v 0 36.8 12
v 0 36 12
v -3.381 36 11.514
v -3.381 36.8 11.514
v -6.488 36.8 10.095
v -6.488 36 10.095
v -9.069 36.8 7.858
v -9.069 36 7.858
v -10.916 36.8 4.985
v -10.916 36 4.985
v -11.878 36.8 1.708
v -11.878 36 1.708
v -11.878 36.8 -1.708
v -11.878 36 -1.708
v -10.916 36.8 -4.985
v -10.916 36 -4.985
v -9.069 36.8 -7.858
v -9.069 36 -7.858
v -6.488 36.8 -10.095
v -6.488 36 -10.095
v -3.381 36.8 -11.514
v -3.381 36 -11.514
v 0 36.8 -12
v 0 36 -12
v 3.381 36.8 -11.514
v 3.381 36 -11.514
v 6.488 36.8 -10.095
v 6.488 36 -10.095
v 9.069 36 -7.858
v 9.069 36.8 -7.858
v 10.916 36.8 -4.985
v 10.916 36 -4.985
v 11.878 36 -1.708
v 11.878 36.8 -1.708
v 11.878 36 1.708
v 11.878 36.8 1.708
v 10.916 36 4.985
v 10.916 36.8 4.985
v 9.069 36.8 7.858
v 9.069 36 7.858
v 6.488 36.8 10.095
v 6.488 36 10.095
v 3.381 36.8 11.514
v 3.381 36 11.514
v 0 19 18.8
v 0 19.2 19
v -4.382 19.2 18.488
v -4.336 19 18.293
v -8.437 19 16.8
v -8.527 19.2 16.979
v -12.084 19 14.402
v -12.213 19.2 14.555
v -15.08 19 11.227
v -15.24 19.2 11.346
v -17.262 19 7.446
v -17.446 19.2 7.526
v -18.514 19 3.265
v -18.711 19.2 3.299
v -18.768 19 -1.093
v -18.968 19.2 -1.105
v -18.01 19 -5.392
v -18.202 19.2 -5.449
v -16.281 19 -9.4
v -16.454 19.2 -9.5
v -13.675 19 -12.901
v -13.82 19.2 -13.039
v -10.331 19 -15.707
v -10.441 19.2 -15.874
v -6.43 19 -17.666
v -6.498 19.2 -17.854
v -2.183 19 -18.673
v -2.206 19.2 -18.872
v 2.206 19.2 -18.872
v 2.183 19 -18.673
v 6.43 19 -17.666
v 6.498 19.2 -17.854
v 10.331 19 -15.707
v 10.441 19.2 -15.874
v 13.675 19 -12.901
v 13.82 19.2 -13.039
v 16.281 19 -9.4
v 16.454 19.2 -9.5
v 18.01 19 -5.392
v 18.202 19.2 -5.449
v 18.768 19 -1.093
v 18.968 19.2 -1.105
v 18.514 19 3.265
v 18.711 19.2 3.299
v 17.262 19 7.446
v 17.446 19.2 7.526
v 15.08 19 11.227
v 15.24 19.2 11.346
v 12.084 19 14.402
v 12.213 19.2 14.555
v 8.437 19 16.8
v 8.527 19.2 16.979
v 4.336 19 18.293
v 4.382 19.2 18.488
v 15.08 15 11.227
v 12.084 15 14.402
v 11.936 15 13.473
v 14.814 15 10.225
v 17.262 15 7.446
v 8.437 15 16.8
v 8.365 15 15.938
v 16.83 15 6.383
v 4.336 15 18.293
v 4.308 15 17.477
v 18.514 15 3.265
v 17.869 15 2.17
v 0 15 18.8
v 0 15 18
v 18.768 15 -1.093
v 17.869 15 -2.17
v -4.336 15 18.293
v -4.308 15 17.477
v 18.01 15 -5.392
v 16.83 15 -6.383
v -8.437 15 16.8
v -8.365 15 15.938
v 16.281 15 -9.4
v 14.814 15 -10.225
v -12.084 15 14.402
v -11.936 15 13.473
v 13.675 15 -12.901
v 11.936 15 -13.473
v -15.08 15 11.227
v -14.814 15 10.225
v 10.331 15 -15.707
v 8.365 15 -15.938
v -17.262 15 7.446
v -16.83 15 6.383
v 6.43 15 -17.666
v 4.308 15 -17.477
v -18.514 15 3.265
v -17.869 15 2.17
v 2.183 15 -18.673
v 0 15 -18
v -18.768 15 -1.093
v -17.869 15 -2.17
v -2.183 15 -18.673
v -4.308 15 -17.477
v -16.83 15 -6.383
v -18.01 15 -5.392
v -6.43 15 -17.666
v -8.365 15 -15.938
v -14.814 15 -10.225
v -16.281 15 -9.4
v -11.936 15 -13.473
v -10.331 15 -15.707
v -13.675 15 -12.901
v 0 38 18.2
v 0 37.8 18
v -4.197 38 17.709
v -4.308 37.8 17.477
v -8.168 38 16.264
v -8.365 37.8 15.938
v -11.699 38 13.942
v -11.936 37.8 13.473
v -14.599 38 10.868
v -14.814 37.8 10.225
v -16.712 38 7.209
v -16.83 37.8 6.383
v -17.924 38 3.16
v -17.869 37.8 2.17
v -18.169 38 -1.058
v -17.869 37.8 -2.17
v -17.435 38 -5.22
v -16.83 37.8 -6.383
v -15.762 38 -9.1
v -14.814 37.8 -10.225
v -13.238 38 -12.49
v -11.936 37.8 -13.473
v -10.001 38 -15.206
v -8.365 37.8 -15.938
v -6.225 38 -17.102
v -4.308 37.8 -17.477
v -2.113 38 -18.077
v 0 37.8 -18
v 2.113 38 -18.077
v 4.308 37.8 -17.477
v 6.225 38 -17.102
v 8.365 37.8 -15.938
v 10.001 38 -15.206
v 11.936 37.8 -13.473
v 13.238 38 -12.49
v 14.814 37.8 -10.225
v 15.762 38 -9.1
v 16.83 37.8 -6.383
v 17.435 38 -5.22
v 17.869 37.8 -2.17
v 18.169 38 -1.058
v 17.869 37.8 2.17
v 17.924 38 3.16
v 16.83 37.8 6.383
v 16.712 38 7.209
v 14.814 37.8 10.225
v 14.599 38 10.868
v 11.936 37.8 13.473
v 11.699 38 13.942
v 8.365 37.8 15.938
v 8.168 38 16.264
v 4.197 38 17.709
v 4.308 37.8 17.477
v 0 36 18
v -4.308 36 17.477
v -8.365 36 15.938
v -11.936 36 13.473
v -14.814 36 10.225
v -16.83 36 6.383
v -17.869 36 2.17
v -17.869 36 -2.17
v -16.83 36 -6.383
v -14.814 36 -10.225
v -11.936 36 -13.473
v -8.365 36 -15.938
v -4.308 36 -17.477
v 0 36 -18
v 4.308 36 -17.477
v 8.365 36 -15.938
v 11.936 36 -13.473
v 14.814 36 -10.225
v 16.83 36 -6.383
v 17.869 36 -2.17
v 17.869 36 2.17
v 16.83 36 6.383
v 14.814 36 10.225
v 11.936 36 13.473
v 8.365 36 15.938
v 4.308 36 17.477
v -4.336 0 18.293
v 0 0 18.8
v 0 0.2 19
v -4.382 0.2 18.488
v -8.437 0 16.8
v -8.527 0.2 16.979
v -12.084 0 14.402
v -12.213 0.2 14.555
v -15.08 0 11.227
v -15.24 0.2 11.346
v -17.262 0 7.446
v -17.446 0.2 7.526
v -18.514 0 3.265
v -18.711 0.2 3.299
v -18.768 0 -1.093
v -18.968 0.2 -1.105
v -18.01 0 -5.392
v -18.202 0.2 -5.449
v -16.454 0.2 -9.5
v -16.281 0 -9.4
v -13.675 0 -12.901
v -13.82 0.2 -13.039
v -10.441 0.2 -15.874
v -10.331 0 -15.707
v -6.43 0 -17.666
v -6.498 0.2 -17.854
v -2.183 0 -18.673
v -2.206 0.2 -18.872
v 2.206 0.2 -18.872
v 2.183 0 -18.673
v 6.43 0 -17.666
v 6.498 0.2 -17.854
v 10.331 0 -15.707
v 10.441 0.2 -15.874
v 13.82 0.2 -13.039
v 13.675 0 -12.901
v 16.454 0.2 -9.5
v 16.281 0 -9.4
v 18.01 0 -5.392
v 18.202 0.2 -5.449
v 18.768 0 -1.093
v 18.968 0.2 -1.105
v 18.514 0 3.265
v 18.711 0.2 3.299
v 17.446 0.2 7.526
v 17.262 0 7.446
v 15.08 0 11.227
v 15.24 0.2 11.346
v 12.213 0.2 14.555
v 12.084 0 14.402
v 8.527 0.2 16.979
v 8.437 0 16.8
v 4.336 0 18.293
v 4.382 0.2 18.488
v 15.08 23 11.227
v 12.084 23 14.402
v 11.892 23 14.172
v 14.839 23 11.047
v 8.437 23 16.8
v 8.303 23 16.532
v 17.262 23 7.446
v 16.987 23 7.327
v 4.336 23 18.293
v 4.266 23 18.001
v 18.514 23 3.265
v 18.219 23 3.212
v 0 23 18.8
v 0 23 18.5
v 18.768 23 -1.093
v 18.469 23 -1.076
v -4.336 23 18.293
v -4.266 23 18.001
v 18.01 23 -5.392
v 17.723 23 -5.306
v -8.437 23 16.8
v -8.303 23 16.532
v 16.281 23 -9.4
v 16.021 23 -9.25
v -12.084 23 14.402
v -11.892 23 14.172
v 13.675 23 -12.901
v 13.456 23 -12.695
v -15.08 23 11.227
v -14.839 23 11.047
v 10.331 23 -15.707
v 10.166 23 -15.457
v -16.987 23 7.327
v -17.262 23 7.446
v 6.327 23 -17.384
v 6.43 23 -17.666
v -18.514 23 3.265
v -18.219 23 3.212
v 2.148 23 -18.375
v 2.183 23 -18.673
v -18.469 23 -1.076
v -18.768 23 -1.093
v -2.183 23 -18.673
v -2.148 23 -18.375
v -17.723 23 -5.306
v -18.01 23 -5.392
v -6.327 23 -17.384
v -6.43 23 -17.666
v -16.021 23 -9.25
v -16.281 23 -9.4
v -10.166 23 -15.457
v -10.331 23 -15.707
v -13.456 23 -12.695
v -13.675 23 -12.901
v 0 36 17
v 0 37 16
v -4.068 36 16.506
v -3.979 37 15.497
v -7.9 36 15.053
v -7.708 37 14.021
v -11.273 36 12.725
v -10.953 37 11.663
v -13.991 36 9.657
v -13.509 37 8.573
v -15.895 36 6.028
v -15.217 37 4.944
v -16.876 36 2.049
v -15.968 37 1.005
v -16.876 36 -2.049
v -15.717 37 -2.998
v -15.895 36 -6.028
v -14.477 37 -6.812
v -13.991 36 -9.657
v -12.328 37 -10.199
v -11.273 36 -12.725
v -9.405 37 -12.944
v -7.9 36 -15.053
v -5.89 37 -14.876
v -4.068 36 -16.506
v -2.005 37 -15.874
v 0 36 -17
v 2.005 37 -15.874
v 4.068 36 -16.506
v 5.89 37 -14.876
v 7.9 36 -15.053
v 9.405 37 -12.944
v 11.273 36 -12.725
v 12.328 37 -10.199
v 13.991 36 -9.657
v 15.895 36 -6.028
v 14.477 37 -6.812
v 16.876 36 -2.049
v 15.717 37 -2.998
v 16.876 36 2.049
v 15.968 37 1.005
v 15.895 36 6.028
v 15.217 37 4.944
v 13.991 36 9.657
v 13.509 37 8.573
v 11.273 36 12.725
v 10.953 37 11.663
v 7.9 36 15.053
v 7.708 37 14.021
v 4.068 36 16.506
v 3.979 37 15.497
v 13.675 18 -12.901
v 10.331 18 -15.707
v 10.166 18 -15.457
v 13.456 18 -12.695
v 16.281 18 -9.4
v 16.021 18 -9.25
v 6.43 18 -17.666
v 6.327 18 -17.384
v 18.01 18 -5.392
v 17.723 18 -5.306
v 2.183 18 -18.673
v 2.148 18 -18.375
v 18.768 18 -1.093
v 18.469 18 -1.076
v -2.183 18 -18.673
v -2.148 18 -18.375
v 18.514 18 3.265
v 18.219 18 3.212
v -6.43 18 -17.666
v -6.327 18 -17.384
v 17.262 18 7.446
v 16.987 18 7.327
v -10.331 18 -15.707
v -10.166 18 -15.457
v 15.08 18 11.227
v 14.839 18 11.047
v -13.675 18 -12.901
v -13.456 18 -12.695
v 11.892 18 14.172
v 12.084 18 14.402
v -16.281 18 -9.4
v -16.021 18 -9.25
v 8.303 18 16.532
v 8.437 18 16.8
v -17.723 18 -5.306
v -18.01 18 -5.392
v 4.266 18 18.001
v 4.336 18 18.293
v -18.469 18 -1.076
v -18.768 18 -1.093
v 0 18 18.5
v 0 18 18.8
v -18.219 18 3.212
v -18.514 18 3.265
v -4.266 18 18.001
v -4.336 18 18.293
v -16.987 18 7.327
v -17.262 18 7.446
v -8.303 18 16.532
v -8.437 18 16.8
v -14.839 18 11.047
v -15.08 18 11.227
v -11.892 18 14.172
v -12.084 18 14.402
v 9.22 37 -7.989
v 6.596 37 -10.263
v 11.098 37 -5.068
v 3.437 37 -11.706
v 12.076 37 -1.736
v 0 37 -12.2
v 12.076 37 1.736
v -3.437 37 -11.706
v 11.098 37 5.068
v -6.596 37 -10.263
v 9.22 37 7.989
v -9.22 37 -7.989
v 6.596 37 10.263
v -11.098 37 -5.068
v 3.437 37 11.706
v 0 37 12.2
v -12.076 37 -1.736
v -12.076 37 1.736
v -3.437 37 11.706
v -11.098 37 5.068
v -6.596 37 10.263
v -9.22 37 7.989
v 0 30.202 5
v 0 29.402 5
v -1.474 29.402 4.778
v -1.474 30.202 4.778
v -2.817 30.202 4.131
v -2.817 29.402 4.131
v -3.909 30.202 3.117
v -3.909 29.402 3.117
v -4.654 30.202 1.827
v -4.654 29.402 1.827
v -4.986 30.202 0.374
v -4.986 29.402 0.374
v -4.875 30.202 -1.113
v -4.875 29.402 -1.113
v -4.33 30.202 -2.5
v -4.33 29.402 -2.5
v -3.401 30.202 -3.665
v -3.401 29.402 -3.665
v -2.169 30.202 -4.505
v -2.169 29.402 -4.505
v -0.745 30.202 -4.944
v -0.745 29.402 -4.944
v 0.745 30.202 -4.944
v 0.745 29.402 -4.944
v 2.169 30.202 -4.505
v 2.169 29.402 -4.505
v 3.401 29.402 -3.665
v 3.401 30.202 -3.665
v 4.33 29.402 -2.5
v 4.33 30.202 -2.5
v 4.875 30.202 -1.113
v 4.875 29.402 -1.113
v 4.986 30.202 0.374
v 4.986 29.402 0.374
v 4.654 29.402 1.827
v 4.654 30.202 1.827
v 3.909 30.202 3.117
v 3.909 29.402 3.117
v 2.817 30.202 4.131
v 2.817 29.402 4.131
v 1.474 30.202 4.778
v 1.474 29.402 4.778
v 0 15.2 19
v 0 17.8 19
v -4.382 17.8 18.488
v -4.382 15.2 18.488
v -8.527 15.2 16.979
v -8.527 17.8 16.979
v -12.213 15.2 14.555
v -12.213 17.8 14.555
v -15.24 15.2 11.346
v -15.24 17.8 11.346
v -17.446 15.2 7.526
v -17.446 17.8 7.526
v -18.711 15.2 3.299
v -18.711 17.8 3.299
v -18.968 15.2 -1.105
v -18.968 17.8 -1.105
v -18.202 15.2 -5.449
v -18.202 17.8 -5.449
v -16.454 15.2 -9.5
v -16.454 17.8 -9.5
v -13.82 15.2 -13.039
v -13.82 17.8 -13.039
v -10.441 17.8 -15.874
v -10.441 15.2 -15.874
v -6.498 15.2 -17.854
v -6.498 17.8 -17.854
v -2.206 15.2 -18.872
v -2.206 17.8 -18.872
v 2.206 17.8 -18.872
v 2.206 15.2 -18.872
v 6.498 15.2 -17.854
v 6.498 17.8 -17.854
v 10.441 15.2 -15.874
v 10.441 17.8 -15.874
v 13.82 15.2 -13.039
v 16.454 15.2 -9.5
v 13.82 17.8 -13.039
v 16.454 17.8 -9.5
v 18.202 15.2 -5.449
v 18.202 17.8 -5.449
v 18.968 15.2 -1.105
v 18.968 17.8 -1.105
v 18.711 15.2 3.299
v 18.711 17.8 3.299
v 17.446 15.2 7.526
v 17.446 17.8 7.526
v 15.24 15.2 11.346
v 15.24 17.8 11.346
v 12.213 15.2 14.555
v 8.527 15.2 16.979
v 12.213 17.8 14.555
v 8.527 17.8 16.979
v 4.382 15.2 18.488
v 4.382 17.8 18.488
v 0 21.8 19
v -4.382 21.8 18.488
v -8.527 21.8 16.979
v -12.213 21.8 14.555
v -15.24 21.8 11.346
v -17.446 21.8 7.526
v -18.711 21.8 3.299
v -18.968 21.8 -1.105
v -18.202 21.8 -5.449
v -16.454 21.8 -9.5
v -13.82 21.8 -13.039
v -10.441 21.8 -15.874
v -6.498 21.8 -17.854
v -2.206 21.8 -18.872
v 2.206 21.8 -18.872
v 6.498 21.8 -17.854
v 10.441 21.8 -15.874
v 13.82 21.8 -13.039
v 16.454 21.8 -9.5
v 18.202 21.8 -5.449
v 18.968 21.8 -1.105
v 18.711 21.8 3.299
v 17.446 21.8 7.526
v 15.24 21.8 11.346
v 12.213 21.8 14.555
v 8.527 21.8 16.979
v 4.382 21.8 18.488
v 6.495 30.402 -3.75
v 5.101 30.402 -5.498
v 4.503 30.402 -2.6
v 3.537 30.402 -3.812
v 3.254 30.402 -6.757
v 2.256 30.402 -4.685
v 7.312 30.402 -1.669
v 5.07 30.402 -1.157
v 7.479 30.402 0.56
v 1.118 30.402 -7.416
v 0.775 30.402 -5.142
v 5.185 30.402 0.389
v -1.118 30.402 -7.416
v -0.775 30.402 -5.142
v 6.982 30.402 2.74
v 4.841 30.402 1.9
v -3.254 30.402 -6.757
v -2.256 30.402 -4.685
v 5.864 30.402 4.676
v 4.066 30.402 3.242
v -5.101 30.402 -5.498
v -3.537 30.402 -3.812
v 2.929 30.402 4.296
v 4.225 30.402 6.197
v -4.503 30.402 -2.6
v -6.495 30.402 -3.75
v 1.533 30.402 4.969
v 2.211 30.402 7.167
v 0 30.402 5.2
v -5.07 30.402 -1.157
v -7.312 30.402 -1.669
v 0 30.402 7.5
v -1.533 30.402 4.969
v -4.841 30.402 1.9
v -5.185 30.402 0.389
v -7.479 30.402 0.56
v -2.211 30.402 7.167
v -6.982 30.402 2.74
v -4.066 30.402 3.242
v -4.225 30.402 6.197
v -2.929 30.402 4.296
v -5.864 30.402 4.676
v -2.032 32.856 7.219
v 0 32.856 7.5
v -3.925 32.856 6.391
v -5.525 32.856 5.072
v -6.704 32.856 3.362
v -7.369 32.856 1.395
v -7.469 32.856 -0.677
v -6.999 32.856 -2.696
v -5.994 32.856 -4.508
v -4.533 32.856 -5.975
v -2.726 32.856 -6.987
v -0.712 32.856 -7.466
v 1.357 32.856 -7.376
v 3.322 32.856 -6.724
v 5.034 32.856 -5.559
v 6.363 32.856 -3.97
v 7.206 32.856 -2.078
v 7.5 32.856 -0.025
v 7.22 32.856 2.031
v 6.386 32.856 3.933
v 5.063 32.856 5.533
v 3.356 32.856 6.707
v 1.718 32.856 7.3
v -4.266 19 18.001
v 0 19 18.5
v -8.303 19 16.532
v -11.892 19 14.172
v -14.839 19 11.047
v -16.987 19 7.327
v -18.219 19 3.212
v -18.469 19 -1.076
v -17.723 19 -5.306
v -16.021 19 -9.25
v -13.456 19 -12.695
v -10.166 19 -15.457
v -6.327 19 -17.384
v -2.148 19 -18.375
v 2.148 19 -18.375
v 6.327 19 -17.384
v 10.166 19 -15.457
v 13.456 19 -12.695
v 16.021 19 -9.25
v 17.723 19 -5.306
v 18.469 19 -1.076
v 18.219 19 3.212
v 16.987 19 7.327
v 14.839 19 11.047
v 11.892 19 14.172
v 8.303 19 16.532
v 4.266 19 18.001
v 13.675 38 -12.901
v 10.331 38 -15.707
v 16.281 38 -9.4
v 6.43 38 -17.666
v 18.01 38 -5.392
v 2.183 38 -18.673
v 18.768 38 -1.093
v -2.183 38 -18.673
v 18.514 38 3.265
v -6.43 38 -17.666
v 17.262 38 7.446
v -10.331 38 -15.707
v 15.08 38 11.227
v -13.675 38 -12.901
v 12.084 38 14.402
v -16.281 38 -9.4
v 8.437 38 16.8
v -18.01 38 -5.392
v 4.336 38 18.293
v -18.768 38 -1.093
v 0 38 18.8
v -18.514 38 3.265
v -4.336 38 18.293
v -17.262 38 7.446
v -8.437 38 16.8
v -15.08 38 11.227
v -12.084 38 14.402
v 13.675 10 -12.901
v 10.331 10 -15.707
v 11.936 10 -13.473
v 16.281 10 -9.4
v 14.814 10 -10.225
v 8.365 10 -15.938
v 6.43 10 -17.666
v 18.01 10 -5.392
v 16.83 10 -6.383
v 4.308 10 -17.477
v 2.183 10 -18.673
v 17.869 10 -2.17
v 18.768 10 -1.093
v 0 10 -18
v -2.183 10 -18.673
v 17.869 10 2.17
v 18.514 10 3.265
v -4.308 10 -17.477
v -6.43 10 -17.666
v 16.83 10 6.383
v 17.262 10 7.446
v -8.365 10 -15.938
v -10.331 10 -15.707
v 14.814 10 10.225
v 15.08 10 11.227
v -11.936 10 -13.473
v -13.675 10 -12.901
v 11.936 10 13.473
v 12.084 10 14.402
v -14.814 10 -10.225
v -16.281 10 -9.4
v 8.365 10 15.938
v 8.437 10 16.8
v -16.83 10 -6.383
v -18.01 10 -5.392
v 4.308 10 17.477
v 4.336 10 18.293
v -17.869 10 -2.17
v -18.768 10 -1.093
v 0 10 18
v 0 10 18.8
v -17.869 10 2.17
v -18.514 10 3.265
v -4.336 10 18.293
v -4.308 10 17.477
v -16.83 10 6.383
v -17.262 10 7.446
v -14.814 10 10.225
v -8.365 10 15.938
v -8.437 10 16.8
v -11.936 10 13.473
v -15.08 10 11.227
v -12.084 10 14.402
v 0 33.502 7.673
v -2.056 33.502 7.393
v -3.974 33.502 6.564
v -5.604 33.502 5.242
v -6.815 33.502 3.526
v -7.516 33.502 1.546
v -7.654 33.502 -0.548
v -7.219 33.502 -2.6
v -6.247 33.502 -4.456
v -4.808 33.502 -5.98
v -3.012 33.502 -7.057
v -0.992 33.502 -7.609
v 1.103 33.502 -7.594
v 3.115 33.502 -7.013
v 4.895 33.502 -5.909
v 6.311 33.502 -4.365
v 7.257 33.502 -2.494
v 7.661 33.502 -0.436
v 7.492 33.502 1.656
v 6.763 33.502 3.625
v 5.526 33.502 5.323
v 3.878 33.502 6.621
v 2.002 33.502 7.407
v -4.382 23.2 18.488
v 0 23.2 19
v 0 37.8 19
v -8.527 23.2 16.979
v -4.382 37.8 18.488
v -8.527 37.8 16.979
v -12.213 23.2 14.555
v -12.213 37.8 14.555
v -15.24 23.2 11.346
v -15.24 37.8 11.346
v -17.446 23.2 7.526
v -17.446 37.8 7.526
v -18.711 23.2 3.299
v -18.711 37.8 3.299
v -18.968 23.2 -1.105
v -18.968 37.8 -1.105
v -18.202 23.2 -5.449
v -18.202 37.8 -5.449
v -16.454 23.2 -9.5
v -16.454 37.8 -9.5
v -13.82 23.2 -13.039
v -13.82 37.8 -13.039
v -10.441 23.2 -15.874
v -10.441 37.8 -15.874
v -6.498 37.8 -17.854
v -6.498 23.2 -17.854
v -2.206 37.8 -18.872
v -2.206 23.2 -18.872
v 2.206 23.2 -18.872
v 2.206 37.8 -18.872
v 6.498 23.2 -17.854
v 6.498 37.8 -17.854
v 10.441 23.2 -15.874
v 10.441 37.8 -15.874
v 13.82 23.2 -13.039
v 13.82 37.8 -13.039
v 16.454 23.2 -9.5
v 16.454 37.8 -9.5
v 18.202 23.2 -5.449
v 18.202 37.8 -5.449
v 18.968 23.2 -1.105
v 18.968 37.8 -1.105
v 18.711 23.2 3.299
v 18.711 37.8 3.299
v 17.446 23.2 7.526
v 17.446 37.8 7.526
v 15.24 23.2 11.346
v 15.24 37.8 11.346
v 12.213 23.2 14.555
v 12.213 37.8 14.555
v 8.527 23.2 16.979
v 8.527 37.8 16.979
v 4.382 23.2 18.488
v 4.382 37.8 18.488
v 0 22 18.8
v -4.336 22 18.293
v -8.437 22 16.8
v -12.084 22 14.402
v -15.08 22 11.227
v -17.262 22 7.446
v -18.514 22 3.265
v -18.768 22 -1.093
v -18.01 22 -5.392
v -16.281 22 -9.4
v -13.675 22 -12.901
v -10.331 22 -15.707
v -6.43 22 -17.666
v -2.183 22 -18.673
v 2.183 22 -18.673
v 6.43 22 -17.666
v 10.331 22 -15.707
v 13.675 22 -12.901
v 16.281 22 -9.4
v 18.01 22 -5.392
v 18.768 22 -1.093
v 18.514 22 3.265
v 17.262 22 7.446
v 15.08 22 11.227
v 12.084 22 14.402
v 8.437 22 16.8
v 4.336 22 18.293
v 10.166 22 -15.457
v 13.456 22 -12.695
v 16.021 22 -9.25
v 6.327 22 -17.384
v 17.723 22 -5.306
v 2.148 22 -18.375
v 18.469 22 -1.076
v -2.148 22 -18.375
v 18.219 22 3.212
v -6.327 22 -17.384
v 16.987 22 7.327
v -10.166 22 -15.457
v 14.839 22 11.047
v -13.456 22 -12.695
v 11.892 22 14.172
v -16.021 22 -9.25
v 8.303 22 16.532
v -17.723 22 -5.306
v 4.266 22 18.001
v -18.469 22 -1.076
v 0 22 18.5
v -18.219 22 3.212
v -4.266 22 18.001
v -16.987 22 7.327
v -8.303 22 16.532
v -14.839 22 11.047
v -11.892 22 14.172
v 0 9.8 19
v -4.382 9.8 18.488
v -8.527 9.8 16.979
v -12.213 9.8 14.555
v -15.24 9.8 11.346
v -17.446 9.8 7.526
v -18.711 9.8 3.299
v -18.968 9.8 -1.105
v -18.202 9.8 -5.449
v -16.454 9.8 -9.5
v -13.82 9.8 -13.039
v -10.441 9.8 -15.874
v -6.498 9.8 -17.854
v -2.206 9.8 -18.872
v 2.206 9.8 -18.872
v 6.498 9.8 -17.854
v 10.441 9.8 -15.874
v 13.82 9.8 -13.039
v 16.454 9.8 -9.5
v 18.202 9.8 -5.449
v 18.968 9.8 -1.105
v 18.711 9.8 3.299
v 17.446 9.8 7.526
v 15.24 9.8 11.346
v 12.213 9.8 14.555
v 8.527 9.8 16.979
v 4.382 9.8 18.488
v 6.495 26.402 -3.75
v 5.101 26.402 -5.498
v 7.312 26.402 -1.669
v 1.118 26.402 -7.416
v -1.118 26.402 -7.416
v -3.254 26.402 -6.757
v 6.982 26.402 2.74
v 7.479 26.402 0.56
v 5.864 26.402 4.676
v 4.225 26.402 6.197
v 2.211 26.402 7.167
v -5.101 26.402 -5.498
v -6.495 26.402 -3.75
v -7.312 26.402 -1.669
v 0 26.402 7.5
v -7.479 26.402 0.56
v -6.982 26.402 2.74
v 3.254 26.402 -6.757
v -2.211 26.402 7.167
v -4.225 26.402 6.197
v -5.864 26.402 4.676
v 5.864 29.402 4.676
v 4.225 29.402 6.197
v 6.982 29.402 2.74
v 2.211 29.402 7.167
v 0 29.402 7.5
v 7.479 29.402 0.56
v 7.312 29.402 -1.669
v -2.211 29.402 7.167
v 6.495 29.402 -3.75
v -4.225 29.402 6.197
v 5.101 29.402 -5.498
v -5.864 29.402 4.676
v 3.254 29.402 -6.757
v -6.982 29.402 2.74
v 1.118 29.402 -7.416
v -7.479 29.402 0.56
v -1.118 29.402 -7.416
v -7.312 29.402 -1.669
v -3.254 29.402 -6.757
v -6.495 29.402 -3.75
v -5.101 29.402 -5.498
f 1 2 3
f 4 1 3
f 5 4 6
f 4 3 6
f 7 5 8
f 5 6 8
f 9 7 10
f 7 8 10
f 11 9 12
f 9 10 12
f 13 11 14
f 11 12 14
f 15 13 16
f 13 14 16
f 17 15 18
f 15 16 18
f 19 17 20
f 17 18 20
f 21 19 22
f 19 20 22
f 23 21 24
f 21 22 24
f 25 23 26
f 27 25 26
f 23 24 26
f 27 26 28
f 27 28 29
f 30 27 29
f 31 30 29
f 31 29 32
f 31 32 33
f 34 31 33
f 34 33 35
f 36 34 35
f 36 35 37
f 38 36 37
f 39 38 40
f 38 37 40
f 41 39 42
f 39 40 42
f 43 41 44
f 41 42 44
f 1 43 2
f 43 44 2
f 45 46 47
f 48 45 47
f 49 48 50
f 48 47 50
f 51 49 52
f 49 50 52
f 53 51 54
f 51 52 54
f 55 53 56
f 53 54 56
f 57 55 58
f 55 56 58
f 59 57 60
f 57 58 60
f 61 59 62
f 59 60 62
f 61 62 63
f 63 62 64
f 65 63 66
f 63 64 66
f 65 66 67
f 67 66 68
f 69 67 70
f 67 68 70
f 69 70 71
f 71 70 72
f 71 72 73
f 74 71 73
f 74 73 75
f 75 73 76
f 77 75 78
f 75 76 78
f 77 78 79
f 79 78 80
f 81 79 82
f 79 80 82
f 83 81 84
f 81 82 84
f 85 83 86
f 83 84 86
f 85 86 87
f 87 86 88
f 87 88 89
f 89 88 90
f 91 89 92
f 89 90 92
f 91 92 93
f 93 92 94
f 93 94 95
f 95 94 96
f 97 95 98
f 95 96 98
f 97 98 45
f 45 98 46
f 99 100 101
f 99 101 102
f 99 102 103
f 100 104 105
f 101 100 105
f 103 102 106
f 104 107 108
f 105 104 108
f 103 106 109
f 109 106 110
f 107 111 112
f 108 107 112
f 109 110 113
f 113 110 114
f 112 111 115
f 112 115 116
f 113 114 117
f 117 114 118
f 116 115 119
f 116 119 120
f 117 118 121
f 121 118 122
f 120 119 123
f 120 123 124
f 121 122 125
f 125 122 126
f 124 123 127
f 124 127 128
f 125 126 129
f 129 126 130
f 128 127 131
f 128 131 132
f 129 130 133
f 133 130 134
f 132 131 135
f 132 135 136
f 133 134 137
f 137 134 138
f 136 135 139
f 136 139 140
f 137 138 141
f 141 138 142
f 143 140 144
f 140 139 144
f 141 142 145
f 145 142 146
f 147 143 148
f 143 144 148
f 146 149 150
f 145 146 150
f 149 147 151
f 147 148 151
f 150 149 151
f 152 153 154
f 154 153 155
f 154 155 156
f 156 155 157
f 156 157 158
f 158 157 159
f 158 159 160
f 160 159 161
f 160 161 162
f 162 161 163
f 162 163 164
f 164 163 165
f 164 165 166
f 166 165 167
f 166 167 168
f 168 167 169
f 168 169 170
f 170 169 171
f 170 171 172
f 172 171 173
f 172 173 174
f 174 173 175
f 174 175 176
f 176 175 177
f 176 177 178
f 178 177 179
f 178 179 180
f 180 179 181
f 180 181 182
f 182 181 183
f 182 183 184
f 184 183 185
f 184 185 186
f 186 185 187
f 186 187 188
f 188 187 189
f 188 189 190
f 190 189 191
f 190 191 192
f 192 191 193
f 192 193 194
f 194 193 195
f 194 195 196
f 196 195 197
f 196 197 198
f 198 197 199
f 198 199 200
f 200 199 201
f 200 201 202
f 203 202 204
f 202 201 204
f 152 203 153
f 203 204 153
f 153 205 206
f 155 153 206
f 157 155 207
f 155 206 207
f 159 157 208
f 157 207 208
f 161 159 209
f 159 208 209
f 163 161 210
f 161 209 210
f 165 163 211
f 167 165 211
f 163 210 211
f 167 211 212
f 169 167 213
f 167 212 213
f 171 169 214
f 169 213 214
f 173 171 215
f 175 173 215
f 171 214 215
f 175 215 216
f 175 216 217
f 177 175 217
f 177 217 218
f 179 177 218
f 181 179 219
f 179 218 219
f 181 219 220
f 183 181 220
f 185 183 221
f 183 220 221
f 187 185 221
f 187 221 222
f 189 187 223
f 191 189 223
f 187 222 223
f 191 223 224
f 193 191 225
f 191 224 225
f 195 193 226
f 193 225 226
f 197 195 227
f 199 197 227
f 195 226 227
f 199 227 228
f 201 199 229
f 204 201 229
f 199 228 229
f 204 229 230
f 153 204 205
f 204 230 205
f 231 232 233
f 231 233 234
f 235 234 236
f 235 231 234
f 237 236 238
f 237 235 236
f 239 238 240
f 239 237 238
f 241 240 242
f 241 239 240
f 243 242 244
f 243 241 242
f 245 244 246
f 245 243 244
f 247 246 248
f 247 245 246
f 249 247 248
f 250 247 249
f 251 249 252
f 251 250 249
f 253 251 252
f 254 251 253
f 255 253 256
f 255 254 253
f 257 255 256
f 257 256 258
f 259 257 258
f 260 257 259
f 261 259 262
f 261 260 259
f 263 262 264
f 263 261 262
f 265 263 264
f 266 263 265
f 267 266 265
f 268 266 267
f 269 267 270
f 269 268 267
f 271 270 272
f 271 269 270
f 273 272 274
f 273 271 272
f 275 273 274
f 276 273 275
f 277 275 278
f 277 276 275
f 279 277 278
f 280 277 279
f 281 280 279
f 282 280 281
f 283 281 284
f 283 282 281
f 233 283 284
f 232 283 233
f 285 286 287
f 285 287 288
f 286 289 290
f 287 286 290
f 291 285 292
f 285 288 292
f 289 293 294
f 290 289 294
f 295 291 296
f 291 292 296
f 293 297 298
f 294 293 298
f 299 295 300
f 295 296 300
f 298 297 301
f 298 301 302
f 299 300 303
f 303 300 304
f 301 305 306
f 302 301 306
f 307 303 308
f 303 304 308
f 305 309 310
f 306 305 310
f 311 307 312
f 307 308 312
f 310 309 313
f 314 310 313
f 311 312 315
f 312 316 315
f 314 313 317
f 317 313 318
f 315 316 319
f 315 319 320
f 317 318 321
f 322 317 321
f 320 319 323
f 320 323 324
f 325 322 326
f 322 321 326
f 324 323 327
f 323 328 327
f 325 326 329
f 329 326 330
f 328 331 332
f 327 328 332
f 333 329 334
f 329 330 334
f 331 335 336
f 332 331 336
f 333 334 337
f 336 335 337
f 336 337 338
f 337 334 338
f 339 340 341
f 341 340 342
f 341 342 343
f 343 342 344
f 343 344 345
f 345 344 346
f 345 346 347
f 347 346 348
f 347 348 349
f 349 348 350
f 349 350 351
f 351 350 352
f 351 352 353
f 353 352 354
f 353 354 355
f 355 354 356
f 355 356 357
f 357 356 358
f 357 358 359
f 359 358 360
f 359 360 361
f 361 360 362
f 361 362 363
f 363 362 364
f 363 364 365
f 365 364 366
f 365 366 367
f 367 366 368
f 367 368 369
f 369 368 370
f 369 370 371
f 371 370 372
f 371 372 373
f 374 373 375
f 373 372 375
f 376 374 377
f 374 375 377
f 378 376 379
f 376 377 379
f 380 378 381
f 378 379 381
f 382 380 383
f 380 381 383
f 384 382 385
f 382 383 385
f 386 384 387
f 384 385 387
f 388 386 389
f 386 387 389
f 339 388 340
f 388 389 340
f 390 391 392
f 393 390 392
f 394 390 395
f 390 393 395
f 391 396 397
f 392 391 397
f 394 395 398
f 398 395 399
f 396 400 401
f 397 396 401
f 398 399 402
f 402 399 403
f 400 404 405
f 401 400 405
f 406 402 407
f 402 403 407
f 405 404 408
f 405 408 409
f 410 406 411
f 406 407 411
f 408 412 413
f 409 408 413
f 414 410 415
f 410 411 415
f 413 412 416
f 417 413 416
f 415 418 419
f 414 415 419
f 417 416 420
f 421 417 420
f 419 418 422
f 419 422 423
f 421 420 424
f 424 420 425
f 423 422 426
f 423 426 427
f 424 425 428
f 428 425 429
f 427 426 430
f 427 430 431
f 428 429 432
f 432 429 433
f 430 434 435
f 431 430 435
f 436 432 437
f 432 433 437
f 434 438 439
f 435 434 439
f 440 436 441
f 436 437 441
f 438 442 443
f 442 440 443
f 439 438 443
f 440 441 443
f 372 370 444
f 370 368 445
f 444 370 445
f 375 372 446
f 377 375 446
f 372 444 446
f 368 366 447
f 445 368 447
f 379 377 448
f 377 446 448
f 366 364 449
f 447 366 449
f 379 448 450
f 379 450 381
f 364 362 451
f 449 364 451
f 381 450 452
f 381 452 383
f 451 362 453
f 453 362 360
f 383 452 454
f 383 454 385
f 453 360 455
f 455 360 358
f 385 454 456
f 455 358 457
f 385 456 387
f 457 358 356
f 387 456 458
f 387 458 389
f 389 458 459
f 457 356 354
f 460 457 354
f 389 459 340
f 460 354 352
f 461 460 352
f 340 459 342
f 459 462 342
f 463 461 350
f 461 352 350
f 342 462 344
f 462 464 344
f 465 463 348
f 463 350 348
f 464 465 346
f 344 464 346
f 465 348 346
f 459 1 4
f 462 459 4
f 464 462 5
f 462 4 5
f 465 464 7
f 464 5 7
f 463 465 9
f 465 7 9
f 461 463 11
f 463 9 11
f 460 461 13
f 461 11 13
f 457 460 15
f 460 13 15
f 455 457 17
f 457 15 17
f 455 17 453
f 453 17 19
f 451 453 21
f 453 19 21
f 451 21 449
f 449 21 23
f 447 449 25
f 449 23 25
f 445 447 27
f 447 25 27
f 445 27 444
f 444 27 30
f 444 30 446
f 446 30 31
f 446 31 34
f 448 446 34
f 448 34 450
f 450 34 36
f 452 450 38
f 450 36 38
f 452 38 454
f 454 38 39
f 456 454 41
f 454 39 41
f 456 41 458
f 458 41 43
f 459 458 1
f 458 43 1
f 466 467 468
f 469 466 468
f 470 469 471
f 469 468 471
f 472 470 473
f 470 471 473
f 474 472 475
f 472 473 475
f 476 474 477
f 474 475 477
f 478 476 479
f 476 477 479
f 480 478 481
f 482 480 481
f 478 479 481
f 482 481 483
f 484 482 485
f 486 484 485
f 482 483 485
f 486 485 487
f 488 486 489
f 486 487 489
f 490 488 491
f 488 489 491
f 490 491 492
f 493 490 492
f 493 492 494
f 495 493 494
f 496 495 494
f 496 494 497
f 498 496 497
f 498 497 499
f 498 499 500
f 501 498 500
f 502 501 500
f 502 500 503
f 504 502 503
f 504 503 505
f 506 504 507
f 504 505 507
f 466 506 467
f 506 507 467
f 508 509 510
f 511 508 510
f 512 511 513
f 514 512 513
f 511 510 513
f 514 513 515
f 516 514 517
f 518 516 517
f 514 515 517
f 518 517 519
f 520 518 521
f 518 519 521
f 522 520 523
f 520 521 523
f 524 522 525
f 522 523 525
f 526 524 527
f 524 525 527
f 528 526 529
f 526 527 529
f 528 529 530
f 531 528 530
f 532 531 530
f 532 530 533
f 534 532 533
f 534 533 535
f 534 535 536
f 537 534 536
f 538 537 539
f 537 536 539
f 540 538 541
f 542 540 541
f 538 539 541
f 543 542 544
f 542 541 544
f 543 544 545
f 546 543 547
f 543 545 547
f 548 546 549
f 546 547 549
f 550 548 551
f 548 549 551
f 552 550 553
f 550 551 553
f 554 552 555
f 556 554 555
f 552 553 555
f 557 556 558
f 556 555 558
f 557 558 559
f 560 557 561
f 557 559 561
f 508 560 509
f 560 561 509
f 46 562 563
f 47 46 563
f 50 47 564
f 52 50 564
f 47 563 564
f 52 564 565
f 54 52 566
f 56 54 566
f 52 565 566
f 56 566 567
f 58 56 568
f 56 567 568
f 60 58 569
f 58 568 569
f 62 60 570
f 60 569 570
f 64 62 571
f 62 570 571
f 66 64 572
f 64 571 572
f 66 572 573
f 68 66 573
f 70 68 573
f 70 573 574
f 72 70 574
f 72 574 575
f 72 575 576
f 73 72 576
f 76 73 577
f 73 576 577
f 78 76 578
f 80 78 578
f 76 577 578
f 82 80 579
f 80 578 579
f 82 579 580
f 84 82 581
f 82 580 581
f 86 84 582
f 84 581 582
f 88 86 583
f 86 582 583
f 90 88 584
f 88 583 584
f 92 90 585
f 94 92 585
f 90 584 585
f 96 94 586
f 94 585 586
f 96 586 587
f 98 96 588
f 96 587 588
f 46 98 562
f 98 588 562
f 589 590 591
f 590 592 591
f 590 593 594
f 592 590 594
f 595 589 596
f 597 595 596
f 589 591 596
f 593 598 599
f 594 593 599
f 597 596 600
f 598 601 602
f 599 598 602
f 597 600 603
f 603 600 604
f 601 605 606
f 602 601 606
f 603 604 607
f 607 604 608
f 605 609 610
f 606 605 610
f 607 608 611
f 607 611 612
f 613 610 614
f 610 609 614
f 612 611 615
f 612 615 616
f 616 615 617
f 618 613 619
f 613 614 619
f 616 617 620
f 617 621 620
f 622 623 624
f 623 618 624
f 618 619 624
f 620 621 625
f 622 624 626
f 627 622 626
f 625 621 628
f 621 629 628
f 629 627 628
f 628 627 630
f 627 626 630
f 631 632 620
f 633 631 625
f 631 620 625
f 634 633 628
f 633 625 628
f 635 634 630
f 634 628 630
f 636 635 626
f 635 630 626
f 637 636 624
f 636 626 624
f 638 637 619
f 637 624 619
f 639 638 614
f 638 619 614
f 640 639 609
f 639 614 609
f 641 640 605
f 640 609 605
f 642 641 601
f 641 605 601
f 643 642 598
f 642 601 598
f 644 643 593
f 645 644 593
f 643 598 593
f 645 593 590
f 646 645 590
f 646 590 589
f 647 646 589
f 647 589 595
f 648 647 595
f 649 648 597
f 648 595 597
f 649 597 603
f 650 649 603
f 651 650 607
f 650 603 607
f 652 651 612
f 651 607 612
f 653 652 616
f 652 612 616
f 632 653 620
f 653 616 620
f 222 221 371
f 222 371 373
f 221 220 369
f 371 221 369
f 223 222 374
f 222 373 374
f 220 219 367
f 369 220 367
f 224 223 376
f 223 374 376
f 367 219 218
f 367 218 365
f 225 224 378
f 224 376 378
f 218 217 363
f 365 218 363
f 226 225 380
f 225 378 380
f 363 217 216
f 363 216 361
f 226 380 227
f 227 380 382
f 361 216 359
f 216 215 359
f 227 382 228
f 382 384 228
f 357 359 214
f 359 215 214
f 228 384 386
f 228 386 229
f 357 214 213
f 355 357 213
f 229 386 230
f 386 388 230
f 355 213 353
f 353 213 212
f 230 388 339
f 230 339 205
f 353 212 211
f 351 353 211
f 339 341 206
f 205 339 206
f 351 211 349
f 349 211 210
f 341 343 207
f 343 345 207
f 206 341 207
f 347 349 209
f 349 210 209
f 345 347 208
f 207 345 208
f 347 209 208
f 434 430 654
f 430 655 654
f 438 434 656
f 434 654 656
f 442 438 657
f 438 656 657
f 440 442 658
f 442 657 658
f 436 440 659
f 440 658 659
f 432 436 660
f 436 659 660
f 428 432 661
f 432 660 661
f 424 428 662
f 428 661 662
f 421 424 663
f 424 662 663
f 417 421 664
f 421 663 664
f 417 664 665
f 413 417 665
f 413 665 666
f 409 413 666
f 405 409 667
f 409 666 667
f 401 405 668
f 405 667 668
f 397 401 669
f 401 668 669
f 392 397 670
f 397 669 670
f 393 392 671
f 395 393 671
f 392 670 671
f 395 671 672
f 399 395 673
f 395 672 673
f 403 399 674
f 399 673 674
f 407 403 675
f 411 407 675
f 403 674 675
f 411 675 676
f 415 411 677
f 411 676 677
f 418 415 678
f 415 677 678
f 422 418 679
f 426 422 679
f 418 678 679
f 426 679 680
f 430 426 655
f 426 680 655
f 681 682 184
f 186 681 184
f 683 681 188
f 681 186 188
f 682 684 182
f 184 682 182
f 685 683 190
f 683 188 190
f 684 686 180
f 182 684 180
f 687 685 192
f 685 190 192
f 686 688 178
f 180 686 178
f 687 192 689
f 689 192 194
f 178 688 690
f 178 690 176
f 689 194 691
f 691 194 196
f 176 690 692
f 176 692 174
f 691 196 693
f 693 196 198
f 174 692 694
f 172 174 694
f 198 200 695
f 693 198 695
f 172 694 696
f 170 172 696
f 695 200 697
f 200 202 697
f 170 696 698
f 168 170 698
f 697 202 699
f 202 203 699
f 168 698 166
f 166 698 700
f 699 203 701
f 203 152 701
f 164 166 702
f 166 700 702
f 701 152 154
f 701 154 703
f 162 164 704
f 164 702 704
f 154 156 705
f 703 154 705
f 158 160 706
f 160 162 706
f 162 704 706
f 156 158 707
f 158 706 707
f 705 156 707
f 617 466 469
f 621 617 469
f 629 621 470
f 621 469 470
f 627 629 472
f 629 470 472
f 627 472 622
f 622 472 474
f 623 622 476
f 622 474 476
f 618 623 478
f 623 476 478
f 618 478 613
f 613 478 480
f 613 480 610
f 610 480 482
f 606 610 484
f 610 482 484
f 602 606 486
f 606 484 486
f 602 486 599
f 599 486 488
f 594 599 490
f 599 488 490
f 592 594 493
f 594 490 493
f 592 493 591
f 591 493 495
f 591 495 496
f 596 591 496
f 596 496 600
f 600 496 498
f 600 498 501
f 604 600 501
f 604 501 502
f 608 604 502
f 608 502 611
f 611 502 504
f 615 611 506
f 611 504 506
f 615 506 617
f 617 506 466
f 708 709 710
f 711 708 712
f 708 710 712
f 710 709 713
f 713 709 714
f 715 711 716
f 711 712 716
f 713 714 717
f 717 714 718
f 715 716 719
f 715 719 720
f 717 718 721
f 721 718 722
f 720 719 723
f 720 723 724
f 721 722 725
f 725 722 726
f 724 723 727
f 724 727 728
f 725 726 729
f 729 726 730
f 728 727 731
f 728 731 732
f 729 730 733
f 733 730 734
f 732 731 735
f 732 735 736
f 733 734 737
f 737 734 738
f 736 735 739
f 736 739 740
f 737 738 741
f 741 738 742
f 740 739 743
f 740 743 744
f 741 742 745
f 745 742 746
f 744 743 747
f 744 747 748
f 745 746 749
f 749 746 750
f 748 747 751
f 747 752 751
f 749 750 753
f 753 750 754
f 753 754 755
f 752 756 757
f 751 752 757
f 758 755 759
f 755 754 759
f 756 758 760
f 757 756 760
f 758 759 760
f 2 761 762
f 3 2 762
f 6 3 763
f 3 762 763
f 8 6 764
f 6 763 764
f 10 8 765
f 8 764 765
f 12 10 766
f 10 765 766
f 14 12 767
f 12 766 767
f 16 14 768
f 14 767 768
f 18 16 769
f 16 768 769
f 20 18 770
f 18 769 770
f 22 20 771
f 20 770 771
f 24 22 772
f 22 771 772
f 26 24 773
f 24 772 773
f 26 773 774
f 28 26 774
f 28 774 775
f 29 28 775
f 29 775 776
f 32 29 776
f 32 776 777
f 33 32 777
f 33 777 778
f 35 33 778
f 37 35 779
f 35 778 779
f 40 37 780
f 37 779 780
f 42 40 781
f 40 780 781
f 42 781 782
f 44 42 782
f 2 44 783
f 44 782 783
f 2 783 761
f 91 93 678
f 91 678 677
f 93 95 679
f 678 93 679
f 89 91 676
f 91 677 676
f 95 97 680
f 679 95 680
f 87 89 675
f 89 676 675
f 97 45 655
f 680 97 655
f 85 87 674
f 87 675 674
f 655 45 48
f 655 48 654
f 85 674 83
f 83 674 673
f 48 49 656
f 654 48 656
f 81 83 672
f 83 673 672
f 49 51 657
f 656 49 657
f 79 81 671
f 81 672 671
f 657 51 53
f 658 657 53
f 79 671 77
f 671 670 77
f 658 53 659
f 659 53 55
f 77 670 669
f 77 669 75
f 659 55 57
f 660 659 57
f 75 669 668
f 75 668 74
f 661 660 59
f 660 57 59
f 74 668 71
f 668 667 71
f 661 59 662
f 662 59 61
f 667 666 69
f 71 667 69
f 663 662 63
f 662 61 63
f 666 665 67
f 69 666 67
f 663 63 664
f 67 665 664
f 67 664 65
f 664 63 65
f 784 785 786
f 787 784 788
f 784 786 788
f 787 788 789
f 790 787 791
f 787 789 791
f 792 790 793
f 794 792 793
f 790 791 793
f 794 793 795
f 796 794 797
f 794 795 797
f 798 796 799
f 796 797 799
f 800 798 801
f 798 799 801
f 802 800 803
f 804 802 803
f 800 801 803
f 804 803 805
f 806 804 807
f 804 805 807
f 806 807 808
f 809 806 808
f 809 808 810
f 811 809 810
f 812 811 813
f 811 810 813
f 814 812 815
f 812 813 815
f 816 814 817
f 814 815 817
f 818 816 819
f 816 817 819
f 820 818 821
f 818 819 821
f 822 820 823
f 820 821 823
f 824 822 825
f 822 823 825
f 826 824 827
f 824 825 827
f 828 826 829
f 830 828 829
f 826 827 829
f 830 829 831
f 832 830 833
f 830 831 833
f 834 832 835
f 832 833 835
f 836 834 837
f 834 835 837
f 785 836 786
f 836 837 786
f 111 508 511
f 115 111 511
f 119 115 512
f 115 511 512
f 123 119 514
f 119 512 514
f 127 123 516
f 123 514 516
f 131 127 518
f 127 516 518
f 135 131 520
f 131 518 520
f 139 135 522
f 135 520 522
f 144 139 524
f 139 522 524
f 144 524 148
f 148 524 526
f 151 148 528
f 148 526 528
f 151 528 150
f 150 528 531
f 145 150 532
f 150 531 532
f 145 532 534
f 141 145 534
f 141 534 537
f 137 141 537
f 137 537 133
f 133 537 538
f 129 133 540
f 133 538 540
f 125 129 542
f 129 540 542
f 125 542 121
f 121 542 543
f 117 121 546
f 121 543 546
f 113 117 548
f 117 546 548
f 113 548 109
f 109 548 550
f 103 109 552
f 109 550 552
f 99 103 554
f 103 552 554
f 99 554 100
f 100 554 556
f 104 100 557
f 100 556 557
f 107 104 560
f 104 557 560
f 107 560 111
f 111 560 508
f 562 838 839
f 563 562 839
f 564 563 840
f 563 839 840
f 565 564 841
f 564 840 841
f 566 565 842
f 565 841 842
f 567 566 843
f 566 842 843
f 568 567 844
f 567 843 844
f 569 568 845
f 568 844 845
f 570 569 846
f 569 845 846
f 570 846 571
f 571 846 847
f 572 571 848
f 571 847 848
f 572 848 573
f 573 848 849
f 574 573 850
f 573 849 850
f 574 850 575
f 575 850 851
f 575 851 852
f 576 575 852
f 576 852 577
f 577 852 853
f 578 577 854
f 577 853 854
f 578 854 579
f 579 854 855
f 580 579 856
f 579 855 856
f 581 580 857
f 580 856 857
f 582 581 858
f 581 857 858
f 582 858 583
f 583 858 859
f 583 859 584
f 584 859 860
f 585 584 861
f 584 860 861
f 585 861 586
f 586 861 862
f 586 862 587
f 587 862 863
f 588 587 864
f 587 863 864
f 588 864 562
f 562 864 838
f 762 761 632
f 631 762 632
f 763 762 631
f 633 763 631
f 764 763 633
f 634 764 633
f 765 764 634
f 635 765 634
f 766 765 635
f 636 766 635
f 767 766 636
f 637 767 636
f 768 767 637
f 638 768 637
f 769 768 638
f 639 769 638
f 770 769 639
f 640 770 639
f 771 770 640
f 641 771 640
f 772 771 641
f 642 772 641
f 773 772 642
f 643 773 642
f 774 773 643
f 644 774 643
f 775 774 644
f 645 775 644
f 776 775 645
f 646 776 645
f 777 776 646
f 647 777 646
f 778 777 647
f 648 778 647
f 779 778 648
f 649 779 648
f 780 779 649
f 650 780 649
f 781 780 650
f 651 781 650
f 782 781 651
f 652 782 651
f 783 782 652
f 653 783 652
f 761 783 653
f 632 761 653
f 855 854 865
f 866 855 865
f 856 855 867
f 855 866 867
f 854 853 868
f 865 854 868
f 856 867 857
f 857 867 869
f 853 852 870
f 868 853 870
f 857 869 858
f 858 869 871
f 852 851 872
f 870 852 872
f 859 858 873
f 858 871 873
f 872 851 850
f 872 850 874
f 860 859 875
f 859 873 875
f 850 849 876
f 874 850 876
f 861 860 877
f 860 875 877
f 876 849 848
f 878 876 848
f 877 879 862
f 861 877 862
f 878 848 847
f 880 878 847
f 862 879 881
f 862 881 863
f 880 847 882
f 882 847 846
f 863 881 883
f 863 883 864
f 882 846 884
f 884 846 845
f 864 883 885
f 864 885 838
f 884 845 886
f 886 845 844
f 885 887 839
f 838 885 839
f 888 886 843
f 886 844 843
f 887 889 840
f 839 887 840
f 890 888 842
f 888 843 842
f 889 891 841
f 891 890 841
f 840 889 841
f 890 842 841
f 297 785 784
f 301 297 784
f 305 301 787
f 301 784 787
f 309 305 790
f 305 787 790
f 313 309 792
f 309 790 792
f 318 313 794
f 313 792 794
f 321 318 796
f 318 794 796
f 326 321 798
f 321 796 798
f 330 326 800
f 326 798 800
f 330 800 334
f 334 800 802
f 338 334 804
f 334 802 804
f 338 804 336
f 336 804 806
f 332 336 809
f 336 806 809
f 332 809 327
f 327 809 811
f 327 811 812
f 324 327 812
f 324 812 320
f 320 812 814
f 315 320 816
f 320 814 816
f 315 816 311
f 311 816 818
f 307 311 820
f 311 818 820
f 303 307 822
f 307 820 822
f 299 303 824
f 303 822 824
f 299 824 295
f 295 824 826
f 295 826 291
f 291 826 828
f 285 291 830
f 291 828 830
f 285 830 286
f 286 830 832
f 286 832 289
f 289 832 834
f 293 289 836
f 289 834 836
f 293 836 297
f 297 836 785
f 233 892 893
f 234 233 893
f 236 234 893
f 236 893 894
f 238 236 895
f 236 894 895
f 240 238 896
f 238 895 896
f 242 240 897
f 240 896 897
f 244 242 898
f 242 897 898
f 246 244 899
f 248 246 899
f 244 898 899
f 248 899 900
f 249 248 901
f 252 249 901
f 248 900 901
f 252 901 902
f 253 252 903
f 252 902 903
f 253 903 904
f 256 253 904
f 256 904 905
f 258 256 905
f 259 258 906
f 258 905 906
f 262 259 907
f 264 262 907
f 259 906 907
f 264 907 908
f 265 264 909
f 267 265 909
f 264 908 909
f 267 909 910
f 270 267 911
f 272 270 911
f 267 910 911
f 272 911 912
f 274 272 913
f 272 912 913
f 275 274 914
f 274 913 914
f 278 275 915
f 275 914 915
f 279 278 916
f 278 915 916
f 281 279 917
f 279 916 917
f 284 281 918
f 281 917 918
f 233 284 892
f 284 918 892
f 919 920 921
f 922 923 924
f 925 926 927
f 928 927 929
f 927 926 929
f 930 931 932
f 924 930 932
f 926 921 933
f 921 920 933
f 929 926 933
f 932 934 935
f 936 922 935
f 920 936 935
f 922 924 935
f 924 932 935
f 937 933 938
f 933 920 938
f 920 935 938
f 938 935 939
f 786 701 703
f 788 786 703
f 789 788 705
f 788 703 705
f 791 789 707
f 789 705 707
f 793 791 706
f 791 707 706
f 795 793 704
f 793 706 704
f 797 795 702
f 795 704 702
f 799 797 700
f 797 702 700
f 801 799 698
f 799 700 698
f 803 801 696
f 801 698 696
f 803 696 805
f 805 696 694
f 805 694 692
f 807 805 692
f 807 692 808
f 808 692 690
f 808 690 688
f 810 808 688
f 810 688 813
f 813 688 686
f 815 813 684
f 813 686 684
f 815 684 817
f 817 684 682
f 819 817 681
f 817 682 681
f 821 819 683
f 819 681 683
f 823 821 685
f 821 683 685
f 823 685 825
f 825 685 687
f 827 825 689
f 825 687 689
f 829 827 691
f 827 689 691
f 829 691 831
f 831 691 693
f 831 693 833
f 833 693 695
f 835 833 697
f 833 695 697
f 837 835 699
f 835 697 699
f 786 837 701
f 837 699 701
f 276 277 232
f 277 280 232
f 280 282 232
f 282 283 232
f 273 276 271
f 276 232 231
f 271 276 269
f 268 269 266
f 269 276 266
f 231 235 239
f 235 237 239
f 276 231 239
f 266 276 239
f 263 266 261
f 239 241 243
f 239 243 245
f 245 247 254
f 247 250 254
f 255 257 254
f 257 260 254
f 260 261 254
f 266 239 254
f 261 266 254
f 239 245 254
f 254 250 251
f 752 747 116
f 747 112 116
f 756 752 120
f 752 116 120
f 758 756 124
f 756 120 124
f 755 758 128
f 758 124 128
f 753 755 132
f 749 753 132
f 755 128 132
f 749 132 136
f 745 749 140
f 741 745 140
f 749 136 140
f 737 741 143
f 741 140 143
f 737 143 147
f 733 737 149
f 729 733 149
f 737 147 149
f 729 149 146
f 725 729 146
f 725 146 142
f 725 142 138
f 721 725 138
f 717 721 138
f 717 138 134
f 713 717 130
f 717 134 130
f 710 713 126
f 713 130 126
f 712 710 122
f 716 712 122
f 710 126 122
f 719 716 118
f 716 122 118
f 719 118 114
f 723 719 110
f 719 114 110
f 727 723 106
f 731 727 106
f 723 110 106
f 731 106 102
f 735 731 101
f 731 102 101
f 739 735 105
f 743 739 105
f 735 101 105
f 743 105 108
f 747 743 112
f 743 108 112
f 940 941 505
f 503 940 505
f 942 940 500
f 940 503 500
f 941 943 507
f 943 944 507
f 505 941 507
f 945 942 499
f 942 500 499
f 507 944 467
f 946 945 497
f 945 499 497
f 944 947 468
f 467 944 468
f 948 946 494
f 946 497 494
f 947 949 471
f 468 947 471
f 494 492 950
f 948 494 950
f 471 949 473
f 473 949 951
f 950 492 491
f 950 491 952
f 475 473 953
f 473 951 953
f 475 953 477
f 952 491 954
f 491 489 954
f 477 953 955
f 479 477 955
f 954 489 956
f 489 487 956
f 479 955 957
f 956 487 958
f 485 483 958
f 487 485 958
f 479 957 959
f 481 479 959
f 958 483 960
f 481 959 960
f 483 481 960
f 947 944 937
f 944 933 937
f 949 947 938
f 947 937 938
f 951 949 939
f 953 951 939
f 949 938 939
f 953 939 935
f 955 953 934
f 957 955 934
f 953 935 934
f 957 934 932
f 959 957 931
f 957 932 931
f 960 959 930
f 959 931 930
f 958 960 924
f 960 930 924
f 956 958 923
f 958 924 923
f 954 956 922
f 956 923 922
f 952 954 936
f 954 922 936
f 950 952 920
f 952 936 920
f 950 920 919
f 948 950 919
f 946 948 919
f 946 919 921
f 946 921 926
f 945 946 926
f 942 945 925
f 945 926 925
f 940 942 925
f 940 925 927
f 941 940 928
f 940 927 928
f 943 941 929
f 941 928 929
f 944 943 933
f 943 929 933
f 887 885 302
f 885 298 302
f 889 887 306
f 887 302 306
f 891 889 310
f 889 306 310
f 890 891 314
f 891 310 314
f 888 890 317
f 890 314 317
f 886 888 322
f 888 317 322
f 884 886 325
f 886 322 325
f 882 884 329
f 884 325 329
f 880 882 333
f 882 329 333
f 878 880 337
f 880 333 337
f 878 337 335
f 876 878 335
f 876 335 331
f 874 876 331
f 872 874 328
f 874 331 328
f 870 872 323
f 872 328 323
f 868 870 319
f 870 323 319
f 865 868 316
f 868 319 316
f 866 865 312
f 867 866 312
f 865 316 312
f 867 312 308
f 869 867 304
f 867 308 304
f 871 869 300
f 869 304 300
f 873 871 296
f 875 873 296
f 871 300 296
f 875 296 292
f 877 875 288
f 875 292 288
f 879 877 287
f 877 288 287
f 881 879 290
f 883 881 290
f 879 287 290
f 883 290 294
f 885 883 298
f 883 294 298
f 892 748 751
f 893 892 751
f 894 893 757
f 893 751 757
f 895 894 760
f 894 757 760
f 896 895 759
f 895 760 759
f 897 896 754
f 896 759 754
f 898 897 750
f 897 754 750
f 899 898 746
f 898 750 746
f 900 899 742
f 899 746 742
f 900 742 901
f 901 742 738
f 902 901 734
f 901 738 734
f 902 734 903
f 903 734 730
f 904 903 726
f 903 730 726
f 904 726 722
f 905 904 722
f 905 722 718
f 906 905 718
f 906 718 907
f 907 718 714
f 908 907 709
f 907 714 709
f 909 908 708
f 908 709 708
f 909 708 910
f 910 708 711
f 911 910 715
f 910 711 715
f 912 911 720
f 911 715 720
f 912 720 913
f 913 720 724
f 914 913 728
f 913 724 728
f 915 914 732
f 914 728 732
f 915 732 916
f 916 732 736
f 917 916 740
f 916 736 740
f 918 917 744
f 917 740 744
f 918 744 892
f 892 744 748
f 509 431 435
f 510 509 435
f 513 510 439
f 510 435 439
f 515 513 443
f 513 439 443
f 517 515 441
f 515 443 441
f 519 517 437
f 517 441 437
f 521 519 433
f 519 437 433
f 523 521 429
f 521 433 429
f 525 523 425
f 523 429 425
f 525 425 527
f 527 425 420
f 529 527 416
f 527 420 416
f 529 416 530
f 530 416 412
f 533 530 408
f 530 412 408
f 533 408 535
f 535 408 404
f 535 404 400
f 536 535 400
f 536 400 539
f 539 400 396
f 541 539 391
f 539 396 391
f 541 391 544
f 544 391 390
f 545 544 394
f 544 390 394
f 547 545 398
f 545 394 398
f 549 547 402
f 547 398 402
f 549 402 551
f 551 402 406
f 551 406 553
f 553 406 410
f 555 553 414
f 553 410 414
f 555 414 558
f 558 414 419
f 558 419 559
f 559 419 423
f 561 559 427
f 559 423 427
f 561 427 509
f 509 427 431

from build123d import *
from OCP.BRepFilletAPI import BRepFilletAPI_MakeChamfer

# Parameters (mm, degrees)
CHAMFER1_SIZE  = 0.2
CHAMFER1_SIZE2 = 0.546410162


with BuildPart() as part:
    # Sketch2 → Revolve1 (revolve)
    with BuildSketch(Plane(origin=(0, 0, 0), x_dir=(0, 0, -1), z_dir=(1, 0, 0))):
        Polygon((-19, 0), (-19, 10), (-18, 10), (-18, 15), (-19, 15), (-19, 18), (-18.5, 18), (-18.5, 19), (-19, 19), (-19, 22), (-18.5, 22), (-18.5, 23), (-19, 23), (-19, 38), (-18, 38), (-18, 36), (-17, 36), (-16, 37), (-12, 37), (-12, 36), (-7.5, 33.401923789), (-7.5, 30.401923789), (-5, 30.401923789), (-5, 29.401923789), (-7.5, 29.401923789), (-7.5, 26.401923789), (0, 26.401923789), (0, 0), align=None)
    revolve(axis=Axis((0, 26.401923789, 0), (0, -1, 0)))

    # Chamfer1: one chamfer whose edges measure the first distance from different faces: ONE call of the kernel's chamfer builder (chamfer() names one face for all edges)
    chamfer1_edges_1 = [part.edges().sort_by_distance(p)[0] for p in [
        (0, 30.401923789, -5),
        (0, 37, -12),
        (0, 38, -18),
        (0, 38, -19),
        (0, 23, -19),
        (0, 22, -19),
        (0, 19, -19),
        (0, 18, -19),
        (0, 15, -19),
        (0, 10, -19),
        (0, 0, -19),
    ]]
    chamfer1_edges_2 = [part.edges().sort_by_distance(p)[0] for p in [
        (0, 33.401923789, -7.5),
    ]]
    chamfer1_side_2 = [part.faces().sort_by_distance(p)[0] for p in [
        (0, 34.700961894, -9.75),
    ]]
    chamfer1 = BRepFilletAPI_MakeChamfer(part.part.solid().wrapped)
    for e in chamfer1_edges_1:
        chamfer1.Add(CHAMFER1_SIZE, e.wrapped)
    for e in chamfer1_edges_2:
        chamfer1.Add(CHAMFER1_SIZE, CHAMFER1_SIZE2, e.wrapped, chamfer1_side_2[0].wrapped)  # the first distance lies on this face
    add(Compound.cast(chamfer1.Shape()), mode=Mode.REPLACE)


solid = part.part
